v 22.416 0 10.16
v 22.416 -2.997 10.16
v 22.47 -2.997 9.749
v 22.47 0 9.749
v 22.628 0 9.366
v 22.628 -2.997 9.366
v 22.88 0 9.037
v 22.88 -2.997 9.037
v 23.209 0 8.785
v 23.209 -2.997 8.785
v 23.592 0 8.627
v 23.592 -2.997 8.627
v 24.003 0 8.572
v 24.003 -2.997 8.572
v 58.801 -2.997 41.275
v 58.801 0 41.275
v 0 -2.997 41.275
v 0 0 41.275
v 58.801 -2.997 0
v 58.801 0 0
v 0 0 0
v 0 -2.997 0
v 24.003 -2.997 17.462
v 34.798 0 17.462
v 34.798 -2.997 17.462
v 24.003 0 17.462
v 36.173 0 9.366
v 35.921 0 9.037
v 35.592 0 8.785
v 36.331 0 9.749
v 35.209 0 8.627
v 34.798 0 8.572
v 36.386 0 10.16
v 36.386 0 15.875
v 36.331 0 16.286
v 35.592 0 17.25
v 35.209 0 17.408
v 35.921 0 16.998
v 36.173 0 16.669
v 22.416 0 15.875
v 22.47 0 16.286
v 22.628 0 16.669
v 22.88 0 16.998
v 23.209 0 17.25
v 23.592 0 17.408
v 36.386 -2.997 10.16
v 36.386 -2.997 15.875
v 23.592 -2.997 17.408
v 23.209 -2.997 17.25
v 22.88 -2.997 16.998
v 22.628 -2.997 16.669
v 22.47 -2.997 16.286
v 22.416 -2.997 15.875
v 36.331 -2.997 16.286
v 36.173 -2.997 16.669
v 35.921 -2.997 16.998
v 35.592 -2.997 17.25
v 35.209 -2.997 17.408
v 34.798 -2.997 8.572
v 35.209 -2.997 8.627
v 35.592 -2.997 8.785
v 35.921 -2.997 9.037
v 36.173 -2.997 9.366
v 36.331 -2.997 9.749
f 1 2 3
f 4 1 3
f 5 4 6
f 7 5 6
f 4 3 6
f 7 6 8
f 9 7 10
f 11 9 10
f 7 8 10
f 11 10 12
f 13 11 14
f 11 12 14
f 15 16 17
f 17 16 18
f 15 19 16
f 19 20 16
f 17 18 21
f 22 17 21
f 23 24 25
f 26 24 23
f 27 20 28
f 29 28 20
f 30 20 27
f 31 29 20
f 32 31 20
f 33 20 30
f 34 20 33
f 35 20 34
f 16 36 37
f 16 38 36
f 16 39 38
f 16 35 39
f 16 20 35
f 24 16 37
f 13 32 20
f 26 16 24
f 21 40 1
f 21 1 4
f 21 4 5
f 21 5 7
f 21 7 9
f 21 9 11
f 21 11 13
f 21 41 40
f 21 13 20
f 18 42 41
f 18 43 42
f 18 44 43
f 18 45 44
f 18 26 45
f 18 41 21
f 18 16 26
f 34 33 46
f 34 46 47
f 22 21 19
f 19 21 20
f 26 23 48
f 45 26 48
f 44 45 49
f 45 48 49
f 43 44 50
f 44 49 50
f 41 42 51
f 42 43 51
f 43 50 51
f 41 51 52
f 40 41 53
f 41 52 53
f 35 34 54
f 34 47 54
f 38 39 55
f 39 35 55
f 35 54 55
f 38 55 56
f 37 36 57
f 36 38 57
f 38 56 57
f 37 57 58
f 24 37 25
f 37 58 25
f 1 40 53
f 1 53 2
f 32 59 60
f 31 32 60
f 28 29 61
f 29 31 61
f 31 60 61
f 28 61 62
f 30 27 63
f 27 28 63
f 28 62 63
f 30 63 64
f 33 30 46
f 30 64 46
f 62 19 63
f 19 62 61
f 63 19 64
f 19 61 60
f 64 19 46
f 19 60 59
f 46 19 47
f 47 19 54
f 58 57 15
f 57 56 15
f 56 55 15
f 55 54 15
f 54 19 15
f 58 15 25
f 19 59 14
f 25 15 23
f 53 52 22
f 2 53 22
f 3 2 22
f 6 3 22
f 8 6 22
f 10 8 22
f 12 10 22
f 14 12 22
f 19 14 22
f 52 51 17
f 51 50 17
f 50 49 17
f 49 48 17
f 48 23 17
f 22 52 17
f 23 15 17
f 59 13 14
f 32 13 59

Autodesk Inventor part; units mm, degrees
ref_plane "YZ Plane" through (0, 0, 0) normal (1, 0, 0) x (0, 1, 0)
ref_plane "XZ Plane" through (0, 0, 0) normal (0, 1, 0) x (-1, 0, 0)
ref_plane "XY Plane" through (0, 0, 0) normal (0, 0, 1) x (1, 0, 0)
sketch "Sketch1" plane through (0, 0, 0) normal (0, 1, 0) x (-1, 0, 0)
  line L0 (0, 0) -> (-58.801, 0)
  line L1 (-58.801, 0) -> (-58.801, 41.275)
  line L2 (-58.801, 41.275) -> (0, 41.275)
  line L3 (0, 41.275) -> (0, 0)
  dimension "d0" = 41.275
  dimension "d1" = 58.801
extrude "Extrusion1" add sketch "Sketch1" against normal blind 2.9972
sketch "Sketch2" plane through (0, 0, 0) normal (0, 1, 0) x (1, 0, 0)
  line L0 (0, -41.275) -> (0, 0) projected
  line L1 (58.801, -41.275) -> (0, -41.275) projected
  line L2 (22.4155, -8.5725) -> (36.3855, -8.5725)
  line L3 (36.3855, -8.5725) -> (36.3855, -17.4625)
  line L4 (36.3855, -17.4625) -> (22.4155, -17.4625)
  line L5 (22.4155, -17.4625) -> (22.4155, -8.5725)
  point P0 (29.4005, -13.0175)
  dimension "d7" = 8.89
  dimension "d17" = 13.97
  dimension "d22" = 6.985
  dimension "d23" = 4.445
  dimension "d24" = 29.4005
  dimension "d26" = 28.2575
extrude "Extrusion2" cut sketch "Sketch2" against normal blind 2.9972
fillet "Fillet1" radius 1.5875 4 edges at (22.4155, -1.4986, 8.5725) (22.4155, -1.4986, 17.4625) (36.3855, -1.4986, 17.4625) (36.3855, -1.4986, 8.5725)
properties part number "Lidar Sensor Case 4 v2"
